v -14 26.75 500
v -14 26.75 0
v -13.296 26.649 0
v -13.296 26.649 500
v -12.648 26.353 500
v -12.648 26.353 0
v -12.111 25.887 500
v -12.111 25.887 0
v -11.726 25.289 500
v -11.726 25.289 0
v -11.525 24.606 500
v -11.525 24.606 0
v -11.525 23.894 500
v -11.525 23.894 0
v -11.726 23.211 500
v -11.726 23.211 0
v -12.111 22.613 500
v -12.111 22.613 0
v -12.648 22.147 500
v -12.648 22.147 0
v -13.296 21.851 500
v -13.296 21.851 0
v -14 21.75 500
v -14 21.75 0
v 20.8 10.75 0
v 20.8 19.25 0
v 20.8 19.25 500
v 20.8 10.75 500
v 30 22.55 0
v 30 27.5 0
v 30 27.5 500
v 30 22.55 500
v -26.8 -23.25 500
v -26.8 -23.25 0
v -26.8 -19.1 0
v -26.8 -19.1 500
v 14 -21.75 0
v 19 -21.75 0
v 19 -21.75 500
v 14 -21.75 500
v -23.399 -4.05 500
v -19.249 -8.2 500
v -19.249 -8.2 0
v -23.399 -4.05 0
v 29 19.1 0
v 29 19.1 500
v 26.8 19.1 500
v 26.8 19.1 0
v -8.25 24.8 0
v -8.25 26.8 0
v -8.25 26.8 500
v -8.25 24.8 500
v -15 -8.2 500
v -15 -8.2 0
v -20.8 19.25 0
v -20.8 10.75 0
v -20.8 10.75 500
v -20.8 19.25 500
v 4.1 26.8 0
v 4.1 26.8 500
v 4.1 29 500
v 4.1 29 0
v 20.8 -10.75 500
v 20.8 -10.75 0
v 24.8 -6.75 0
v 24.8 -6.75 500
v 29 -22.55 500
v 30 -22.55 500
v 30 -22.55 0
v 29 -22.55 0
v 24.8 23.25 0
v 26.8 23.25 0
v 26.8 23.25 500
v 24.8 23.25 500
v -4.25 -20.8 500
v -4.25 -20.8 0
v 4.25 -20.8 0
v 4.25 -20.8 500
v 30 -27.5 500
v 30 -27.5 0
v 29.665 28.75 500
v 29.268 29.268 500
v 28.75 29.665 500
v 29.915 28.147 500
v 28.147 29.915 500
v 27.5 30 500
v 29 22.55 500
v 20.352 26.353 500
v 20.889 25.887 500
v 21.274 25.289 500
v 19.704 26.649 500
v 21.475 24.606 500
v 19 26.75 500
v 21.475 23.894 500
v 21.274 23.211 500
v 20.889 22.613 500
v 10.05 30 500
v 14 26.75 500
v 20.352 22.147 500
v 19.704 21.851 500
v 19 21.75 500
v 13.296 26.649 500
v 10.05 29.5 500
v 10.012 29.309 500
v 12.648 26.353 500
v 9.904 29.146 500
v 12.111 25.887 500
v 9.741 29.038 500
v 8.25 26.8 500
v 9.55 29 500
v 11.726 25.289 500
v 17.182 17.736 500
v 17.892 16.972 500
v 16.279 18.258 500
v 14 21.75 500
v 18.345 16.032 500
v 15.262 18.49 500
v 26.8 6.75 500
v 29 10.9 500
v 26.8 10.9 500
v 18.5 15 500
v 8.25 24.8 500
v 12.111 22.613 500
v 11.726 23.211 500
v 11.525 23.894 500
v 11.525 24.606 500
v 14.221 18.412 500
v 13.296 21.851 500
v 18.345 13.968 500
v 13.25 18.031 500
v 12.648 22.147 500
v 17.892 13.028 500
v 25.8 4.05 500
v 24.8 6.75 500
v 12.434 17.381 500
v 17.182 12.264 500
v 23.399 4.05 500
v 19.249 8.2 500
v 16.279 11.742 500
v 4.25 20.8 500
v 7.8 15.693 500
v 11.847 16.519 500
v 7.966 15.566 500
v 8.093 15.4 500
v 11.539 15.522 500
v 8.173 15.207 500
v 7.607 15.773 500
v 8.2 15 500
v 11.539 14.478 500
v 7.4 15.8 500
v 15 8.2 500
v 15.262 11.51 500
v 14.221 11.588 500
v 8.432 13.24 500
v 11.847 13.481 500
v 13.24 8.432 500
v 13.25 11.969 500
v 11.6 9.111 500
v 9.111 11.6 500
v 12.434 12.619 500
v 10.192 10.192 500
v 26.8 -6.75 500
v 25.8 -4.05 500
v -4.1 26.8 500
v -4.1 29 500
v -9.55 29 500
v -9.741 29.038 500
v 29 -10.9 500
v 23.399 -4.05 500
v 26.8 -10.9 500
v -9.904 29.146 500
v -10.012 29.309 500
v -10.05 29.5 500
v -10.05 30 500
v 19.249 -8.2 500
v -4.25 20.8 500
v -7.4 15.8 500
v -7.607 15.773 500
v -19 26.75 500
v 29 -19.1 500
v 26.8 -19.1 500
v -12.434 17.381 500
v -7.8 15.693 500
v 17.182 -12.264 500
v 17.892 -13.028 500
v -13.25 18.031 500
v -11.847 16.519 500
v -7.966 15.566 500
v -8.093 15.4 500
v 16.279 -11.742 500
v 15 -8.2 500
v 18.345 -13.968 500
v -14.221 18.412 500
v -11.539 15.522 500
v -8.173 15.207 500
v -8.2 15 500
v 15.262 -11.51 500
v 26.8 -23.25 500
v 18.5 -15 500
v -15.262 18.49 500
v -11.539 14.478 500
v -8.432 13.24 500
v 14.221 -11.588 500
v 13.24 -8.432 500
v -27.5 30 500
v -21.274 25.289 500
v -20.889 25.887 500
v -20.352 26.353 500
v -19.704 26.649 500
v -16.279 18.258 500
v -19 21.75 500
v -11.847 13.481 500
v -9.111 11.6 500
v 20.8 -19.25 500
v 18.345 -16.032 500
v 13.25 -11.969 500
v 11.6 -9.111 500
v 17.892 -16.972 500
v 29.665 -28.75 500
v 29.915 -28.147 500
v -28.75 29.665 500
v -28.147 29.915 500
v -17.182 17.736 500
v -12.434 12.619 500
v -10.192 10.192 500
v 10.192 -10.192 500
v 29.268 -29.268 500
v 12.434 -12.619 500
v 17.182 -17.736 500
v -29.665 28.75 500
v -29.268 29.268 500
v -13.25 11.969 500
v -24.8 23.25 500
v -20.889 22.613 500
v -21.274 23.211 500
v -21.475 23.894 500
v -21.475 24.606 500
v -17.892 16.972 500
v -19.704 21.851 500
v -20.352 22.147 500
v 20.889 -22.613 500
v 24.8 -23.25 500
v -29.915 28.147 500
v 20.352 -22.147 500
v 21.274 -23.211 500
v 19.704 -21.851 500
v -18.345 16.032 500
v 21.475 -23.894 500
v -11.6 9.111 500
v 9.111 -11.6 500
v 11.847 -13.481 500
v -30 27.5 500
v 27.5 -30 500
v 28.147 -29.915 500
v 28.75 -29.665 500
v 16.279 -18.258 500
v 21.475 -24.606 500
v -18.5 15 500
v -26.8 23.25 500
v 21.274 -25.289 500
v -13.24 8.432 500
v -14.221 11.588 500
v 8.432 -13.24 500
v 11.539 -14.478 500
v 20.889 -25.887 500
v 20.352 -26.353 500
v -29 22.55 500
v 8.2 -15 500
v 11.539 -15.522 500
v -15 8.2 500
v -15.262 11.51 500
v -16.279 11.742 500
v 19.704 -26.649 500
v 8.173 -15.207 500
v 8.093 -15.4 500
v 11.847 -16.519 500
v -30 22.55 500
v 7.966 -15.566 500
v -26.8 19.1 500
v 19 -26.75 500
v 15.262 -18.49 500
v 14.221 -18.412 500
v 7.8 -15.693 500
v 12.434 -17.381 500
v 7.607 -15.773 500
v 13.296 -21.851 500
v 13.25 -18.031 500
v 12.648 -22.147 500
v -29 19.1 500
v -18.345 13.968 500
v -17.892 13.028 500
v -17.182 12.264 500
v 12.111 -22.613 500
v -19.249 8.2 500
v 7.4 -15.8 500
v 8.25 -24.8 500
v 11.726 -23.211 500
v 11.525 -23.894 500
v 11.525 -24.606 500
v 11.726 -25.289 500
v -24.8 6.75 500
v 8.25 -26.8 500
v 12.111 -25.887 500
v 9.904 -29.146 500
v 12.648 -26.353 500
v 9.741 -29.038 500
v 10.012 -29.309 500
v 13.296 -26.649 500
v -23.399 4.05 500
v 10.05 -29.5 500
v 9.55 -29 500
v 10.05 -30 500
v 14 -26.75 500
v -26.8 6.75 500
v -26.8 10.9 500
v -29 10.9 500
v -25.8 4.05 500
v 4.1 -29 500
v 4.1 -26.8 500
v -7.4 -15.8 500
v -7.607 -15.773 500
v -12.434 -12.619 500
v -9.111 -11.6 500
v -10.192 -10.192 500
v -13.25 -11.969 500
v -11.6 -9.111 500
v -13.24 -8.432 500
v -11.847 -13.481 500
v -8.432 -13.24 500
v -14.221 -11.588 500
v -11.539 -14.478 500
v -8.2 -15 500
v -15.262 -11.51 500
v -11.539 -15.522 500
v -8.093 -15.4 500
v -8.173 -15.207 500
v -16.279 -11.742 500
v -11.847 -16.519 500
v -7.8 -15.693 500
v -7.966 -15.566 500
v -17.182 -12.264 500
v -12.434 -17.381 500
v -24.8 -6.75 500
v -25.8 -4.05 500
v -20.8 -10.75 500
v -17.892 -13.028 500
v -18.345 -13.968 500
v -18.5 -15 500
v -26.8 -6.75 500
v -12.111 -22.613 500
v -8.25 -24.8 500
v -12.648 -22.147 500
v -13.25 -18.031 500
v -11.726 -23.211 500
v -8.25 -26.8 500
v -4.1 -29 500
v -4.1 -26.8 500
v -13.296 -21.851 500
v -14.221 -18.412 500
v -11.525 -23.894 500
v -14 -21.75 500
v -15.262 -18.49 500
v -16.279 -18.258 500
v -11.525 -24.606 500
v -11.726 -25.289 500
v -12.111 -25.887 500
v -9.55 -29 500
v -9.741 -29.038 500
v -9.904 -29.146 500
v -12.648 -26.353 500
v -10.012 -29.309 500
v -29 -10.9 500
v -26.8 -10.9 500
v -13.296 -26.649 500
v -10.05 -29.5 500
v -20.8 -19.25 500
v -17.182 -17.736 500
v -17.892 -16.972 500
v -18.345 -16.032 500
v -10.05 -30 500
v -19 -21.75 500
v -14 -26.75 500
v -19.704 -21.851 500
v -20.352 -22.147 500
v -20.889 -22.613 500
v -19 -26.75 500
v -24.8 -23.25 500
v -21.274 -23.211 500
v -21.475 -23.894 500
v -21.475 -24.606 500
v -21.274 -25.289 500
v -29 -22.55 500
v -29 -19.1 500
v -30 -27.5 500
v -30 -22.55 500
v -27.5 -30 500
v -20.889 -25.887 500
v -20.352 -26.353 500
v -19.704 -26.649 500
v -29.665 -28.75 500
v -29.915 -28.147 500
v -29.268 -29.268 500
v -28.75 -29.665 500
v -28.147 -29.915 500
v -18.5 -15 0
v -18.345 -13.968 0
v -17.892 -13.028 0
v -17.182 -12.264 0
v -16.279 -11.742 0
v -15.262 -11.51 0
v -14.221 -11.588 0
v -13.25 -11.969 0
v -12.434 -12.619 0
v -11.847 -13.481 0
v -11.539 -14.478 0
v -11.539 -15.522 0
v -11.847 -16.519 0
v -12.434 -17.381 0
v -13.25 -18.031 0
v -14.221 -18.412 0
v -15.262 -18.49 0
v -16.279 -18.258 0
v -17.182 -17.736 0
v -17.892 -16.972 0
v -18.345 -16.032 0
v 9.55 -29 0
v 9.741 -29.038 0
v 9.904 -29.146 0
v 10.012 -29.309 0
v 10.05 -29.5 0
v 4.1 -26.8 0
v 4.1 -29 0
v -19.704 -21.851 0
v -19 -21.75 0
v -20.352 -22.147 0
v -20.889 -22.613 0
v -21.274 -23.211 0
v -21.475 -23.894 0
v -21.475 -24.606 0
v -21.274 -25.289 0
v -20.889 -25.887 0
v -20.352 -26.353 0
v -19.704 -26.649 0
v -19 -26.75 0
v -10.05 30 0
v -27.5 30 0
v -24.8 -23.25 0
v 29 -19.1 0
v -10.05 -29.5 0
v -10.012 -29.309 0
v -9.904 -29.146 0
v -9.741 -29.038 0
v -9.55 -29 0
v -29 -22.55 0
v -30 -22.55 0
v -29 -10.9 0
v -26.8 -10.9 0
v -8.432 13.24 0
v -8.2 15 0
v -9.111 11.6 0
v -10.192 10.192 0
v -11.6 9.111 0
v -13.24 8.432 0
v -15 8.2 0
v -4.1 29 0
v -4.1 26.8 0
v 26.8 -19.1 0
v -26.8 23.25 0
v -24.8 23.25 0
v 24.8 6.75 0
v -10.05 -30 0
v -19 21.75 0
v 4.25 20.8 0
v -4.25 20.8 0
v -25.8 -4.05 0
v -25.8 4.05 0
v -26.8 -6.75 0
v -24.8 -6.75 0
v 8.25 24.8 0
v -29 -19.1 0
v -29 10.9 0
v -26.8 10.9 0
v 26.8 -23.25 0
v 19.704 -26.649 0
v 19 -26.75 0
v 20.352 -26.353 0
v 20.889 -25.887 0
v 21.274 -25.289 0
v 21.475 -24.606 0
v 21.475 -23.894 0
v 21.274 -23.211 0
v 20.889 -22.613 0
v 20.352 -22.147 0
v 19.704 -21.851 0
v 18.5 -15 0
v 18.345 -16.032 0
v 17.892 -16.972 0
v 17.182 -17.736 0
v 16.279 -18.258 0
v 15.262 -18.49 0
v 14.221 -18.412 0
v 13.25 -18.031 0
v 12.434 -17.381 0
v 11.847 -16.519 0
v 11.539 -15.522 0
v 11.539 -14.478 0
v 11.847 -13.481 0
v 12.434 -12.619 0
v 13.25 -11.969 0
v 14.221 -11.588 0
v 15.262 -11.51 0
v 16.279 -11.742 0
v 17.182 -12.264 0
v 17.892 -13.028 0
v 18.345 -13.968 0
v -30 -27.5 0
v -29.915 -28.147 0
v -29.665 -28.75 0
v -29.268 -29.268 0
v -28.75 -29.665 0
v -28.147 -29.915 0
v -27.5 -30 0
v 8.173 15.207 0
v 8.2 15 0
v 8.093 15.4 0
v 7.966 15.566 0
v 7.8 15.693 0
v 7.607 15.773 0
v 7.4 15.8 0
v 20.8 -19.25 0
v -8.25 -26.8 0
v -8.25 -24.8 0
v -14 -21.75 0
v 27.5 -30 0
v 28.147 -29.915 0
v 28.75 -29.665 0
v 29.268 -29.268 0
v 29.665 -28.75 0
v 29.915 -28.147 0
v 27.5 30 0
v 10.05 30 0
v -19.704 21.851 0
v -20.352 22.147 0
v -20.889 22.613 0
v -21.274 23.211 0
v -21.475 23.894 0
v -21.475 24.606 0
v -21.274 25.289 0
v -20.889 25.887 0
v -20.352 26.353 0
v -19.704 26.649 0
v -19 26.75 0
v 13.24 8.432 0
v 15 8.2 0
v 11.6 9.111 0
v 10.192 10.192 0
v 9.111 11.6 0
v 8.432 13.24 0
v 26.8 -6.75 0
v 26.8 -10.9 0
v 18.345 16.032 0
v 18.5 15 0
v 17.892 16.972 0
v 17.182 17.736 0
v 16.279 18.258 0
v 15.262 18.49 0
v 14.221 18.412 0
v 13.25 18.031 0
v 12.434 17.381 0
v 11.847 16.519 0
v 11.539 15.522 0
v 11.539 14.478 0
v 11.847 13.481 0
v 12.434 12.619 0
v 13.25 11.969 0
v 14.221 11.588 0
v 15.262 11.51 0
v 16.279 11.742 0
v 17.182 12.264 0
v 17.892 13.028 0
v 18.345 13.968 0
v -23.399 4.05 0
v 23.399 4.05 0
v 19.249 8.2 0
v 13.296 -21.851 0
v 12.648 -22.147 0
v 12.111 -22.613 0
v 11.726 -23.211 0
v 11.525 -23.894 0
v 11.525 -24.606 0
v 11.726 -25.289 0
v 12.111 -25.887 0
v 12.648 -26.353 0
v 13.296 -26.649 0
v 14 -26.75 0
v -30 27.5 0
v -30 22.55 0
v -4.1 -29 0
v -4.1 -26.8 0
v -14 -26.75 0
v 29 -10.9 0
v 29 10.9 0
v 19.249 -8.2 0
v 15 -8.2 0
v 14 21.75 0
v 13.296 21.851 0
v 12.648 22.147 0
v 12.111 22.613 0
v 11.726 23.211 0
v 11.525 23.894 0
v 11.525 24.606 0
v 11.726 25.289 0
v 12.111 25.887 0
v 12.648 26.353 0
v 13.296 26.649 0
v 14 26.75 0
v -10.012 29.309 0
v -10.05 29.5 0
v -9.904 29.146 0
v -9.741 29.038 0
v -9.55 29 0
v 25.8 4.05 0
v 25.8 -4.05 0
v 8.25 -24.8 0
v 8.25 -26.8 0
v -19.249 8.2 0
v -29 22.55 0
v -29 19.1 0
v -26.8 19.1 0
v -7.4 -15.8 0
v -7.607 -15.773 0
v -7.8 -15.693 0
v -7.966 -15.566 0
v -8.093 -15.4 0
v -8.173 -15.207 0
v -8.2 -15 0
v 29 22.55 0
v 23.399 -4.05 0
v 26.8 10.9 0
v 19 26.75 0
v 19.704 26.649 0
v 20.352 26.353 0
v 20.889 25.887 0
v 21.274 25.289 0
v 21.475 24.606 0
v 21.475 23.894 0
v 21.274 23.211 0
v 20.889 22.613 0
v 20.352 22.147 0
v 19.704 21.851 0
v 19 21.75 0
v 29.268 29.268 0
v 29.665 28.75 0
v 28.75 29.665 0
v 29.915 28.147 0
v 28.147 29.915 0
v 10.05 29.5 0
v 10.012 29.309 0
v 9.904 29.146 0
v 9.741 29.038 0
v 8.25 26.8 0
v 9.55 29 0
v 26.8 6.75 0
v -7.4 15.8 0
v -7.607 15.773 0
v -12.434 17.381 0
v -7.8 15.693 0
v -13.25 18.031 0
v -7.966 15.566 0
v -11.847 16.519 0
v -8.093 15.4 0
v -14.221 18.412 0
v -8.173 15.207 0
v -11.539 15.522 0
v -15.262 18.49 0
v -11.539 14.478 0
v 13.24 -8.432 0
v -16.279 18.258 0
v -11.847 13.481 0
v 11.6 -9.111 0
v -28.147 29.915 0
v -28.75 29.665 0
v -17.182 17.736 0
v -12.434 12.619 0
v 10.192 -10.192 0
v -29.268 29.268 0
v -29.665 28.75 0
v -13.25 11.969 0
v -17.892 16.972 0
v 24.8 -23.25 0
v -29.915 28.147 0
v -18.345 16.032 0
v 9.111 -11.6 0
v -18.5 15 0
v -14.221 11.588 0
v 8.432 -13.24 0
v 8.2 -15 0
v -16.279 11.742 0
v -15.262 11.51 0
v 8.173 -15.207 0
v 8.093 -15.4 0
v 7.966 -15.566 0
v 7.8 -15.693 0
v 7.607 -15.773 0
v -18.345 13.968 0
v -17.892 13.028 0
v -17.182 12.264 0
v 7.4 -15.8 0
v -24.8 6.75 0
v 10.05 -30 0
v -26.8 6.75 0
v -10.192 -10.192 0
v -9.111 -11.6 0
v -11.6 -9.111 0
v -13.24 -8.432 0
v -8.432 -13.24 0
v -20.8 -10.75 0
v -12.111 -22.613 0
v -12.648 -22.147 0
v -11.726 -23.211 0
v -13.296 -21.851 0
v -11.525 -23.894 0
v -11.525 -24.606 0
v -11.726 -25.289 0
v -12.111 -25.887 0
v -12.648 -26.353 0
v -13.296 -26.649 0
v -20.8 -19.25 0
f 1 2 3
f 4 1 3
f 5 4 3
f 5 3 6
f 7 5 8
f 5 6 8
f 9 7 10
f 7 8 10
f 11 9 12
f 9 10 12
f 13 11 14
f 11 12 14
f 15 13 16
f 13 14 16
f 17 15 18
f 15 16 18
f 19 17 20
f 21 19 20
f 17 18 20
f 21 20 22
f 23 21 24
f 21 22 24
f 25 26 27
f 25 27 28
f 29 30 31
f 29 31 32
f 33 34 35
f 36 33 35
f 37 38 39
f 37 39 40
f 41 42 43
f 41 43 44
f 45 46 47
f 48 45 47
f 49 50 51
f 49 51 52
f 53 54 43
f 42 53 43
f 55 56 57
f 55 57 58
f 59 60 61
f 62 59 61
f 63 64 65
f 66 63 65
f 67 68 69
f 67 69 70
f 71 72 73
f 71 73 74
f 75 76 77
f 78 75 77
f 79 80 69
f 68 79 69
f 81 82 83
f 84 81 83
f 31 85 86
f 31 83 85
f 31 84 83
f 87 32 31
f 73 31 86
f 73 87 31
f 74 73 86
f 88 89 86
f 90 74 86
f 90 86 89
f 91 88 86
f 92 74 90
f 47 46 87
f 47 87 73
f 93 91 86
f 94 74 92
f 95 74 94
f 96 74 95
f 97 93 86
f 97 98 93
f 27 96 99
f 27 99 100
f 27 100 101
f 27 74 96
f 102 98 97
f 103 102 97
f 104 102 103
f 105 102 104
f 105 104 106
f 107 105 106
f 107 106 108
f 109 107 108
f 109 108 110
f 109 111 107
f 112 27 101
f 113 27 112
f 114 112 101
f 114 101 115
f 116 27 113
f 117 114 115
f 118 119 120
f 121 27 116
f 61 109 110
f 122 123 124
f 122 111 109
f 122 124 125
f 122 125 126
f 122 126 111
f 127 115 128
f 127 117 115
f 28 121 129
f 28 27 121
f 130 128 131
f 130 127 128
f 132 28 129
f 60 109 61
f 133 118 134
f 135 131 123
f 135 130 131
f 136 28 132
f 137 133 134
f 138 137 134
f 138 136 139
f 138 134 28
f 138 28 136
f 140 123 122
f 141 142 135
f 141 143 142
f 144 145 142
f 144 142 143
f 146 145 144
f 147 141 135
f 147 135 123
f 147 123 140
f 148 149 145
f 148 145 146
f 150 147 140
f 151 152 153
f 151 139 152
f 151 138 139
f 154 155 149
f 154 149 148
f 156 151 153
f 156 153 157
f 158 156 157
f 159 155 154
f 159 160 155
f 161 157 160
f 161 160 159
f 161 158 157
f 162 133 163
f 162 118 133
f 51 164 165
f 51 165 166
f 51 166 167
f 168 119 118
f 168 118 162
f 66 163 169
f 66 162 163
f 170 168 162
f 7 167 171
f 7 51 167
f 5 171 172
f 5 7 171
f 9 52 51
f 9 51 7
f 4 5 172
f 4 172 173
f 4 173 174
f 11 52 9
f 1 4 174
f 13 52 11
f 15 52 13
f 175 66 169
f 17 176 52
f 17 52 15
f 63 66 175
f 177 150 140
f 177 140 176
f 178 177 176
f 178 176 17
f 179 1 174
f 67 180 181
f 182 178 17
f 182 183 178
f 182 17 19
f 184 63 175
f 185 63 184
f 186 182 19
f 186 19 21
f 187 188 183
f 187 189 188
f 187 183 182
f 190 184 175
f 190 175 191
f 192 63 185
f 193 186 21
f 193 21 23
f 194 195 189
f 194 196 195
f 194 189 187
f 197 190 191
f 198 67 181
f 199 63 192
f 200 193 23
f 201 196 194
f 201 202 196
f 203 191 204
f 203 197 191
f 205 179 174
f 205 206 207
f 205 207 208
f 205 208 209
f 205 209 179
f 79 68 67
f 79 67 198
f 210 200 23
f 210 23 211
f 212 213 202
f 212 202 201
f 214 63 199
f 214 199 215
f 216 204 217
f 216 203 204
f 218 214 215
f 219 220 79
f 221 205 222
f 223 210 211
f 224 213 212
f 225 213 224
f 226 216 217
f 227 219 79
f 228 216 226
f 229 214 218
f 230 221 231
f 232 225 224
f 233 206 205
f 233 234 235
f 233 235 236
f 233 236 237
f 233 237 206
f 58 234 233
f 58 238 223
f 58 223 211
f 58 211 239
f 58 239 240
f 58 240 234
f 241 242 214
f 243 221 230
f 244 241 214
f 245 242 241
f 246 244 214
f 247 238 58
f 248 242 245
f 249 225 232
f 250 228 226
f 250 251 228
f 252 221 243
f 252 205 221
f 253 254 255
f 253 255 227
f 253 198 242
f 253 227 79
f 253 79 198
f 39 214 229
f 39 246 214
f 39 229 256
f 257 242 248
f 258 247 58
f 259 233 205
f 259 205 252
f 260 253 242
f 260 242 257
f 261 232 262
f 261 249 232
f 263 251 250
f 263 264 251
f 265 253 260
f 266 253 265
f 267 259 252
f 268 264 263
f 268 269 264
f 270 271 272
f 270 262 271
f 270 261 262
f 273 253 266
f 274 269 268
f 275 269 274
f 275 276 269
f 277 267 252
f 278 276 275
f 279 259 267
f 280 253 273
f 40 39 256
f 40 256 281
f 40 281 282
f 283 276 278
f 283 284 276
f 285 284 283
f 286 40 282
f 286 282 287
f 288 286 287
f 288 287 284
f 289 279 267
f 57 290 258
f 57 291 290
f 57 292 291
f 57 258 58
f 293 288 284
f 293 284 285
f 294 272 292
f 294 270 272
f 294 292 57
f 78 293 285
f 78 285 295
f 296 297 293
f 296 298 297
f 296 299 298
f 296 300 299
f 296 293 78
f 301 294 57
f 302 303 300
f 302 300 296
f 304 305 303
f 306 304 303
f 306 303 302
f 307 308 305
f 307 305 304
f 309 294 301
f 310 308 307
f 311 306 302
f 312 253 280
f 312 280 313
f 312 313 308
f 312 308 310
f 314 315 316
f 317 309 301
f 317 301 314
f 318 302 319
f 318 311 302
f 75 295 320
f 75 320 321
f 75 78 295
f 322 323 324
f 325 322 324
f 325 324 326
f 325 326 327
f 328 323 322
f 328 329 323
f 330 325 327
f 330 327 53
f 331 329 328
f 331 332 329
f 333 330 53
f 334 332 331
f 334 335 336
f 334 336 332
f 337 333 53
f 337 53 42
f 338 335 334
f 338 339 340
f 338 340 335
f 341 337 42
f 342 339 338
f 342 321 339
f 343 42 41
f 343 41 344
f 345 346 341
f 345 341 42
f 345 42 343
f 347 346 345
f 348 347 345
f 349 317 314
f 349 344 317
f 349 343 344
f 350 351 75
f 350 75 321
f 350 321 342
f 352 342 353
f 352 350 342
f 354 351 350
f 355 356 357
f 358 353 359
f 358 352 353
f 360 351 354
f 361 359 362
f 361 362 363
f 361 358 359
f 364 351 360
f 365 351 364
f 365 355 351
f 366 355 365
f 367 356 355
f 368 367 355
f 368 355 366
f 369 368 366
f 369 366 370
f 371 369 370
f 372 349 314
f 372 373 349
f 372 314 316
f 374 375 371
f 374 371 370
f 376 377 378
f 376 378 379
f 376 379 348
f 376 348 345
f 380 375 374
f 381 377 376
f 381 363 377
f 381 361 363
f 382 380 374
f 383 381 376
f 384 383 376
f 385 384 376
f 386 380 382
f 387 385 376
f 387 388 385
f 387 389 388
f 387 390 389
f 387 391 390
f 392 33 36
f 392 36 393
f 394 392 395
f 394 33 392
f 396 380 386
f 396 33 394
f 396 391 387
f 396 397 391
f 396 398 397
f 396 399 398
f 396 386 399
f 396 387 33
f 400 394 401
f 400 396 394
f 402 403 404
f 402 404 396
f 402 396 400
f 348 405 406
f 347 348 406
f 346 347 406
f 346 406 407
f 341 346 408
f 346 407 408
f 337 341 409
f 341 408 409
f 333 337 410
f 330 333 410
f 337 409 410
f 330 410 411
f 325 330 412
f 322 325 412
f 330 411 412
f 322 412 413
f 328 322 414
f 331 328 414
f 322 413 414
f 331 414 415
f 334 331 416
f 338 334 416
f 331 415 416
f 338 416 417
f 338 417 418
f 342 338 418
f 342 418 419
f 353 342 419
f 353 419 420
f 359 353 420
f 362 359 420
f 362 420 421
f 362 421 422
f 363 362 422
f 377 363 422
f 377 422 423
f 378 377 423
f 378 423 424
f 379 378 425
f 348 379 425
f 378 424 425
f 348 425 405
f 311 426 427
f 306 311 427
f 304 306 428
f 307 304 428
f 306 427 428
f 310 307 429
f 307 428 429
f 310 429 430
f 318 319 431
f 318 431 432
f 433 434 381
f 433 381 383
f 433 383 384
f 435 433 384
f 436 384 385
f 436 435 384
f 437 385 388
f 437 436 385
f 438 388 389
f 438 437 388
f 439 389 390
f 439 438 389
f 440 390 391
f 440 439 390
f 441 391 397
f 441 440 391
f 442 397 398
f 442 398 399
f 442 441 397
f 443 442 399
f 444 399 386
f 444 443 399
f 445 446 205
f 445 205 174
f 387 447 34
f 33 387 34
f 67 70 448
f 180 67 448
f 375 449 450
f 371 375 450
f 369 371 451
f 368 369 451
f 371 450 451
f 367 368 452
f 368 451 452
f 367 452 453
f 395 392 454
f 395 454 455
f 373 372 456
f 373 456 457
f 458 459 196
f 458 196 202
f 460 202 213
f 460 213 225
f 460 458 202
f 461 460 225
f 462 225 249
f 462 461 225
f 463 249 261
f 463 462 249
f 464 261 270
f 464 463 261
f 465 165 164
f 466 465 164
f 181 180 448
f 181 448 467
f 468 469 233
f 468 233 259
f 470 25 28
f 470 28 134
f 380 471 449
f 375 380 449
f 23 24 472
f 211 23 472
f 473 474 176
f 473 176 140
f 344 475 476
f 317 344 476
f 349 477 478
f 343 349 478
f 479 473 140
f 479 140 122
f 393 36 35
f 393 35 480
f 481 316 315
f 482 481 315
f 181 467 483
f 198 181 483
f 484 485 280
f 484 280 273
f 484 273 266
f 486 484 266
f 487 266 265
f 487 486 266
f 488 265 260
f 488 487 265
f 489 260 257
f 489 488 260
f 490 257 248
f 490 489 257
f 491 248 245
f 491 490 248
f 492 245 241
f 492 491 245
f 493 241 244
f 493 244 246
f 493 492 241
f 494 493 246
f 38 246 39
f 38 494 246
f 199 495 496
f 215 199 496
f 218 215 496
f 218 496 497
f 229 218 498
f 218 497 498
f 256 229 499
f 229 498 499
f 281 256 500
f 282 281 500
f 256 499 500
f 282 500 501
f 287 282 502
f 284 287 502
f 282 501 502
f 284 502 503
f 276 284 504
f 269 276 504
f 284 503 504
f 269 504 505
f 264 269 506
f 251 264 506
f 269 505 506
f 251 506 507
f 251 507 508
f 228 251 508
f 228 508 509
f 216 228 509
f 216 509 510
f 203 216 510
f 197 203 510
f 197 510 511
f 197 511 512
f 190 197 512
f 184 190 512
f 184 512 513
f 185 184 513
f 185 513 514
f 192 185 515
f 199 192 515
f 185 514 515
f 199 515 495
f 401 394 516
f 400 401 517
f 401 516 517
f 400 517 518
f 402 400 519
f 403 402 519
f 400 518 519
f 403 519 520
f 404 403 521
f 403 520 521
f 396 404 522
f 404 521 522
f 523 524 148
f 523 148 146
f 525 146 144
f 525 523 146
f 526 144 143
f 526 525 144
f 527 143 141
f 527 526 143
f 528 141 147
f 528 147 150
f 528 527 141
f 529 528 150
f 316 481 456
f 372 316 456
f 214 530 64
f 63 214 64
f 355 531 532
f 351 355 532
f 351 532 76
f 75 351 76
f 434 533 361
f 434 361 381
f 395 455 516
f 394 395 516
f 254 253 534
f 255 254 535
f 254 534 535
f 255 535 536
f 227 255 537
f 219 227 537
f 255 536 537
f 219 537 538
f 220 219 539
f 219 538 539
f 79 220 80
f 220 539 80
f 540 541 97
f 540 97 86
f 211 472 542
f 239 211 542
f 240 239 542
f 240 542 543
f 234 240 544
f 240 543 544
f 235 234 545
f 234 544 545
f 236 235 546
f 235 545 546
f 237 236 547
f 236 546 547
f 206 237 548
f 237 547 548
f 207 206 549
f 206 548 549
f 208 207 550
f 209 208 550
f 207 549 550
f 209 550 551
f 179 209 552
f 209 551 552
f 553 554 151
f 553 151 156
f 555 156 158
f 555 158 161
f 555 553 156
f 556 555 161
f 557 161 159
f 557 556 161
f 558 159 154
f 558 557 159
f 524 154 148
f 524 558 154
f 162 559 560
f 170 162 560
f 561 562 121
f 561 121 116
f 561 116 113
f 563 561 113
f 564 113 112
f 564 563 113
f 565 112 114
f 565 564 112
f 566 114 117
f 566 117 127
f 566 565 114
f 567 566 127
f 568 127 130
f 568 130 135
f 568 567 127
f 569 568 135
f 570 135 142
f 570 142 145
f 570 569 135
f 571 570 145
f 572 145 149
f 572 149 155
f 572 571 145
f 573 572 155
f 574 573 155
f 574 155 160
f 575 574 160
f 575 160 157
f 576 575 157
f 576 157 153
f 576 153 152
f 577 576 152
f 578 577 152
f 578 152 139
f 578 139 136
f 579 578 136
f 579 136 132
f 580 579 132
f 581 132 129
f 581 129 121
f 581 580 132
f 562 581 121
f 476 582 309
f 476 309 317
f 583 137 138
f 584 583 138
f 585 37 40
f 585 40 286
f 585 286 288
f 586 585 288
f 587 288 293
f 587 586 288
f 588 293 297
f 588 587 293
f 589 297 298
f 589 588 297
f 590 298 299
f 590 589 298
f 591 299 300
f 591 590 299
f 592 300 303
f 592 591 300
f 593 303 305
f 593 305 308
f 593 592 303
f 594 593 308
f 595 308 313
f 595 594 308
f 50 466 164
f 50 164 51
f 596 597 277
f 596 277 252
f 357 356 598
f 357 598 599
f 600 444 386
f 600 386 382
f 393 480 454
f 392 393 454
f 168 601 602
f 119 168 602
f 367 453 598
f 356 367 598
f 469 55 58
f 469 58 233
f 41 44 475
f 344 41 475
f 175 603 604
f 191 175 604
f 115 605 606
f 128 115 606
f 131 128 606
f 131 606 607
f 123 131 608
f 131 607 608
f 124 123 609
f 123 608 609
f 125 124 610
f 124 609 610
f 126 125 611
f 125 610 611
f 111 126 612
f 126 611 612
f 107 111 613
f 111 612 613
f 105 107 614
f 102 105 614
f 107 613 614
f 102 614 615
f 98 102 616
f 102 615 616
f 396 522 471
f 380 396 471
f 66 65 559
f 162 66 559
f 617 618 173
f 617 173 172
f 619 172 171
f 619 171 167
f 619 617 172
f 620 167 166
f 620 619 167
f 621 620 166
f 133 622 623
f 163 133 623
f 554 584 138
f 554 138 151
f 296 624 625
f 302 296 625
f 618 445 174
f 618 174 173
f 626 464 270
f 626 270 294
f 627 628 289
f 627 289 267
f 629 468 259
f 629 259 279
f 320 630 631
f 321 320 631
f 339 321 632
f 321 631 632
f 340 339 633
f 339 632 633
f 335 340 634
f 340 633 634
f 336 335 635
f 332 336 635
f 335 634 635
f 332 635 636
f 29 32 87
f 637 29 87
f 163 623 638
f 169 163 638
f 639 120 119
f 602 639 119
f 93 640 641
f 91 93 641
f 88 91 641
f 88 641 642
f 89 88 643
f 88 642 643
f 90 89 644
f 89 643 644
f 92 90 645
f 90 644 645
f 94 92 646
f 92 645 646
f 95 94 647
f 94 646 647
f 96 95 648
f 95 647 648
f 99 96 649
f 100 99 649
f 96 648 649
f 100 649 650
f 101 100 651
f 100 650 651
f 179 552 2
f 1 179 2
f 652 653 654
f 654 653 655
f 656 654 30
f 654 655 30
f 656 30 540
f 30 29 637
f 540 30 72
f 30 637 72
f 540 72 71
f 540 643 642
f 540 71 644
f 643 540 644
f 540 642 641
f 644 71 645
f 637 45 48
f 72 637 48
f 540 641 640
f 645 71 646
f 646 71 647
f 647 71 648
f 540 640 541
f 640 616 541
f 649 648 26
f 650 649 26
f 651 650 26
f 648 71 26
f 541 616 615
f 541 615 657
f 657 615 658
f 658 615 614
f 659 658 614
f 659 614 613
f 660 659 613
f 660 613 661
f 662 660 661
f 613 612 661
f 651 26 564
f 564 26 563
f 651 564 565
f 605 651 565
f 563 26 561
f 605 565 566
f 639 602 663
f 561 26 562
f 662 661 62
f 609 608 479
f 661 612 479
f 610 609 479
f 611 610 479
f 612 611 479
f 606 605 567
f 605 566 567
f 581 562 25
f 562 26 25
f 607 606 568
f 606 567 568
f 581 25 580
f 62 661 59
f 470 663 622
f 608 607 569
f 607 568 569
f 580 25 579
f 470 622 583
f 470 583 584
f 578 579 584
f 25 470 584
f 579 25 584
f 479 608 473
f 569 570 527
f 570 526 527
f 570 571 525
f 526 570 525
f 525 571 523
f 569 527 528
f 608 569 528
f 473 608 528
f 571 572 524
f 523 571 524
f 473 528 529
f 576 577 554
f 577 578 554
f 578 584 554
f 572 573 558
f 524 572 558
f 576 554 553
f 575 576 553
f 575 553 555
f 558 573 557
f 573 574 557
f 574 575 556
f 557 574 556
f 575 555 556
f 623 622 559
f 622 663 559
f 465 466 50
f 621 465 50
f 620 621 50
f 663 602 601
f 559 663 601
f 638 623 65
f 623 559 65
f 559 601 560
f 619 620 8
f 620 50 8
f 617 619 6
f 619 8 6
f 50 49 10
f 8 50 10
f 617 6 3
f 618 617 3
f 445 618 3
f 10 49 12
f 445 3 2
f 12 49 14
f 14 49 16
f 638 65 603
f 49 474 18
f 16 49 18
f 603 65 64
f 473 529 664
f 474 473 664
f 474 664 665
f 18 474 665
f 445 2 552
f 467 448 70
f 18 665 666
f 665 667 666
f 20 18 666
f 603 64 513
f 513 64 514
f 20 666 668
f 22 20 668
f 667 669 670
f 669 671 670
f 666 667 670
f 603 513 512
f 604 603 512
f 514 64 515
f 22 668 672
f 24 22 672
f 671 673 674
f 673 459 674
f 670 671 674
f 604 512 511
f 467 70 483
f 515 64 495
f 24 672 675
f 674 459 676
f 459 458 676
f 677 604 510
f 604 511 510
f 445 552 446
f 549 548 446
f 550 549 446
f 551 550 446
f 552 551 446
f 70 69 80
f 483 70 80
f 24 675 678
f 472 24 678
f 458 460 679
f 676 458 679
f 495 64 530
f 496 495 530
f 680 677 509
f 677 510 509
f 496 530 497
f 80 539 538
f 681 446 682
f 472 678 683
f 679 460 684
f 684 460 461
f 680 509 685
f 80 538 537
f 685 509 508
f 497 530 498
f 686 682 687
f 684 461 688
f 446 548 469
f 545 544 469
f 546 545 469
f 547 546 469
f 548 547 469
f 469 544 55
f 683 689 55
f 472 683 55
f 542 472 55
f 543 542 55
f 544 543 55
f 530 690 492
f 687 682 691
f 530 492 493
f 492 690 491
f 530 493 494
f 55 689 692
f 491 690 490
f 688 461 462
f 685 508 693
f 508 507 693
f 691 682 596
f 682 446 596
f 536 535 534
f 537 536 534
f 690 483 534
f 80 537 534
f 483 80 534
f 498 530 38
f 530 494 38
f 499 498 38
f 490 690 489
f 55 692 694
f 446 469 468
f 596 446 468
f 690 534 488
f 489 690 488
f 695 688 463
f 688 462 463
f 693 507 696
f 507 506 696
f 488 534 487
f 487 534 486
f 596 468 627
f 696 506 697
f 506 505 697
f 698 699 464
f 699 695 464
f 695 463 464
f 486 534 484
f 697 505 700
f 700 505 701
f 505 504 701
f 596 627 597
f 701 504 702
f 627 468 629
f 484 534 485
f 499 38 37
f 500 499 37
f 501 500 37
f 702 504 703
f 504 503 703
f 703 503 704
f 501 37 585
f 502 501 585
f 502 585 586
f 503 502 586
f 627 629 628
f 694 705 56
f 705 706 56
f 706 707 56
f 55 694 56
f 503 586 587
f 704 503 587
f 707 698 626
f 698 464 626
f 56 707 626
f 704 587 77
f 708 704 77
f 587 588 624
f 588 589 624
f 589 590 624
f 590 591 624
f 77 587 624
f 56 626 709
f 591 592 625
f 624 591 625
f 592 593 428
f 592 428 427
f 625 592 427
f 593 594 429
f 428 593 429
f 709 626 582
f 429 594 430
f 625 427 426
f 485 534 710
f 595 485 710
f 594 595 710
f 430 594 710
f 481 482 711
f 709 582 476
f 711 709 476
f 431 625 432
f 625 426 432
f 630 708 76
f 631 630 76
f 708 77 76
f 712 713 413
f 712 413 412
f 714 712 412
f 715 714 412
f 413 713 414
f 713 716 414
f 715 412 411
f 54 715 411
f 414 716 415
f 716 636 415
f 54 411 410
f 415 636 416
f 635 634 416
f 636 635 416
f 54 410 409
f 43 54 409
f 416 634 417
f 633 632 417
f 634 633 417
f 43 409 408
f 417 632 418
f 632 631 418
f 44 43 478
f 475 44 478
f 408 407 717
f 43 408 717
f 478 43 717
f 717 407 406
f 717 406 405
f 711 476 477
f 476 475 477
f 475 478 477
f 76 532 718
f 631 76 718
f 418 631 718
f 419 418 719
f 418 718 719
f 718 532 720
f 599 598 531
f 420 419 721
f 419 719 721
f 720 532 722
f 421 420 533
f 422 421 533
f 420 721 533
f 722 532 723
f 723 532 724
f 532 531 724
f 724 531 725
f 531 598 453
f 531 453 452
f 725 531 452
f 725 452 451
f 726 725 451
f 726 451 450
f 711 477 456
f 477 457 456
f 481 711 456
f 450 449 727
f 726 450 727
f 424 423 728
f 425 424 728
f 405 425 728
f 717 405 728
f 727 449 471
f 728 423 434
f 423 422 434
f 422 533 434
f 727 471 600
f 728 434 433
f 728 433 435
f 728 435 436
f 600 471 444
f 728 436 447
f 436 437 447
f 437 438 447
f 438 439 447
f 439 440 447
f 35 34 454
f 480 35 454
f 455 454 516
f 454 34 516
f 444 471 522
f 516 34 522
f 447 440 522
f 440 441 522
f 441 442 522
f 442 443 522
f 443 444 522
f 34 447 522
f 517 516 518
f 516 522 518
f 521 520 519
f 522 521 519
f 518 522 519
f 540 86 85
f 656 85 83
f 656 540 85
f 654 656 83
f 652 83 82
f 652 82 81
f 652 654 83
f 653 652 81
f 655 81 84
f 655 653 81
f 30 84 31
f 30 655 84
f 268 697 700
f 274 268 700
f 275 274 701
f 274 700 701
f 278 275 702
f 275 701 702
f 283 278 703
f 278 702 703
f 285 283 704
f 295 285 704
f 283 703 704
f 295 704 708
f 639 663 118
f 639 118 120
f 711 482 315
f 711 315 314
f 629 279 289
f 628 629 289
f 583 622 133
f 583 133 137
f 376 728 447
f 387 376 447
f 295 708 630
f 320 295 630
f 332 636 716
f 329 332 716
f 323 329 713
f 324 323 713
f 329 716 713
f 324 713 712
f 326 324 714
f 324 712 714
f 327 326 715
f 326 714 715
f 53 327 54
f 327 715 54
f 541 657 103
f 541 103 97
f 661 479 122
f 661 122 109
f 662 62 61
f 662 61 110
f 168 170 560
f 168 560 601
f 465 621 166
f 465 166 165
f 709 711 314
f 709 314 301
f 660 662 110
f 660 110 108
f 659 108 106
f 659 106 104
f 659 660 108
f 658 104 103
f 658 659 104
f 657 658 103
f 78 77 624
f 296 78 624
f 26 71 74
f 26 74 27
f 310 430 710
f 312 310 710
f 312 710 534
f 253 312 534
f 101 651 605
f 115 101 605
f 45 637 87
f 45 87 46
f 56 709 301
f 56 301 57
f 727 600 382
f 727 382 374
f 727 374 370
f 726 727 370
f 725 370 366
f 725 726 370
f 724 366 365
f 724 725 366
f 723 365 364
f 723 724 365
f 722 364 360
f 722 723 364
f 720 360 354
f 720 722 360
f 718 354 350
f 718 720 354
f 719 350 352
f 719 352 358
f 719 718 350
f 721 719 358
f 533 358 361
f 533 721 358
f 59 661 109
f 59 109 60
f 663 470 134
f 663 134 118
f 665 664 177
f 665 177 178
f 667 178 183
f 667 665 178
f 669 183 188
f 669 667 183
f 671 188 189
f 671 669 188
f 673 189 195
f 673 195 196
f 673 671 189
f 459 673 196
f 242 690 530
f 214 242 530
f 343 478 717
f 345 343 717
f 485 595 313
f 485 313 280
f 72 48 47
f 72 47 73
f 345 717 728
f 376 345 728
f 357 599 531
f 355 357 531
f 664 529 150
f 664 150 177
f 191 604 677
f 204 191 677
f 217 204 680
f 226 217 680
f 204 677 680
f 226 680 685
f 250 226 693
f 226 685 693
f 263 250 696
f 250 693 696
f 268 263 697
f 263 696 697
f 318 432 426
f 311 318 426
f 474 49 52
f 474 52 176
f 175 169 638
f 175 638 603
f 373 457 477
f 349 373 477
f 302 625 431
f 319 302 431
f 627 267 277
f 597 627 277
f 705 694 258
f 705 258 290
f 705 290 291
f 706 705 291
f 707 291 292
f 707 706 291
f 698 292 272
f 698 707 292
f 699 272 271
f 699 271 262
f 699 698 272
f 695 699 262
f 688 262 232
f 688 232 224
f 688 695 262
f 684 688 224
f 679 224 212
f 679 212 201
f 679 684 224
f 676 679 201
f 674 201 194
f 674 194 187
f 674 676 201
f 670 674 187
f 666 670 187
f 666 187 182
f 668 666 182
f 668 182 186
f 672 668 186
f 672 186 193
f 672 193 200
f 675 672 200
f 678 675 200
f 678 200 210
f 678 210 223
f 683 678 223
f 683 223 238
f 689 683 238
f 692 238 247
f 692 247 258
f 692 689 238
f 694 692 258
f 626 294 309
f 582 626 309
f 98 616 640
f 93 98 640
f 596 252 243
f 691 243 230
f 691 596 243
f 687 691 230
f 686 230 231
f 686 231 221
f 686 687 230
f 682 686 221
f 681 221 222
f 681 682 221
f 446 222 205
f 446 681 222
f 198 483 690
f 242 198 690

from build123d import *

# Parameters (mm, degrees)
SKETCH_2_R      = 3.5
EXTRUDE_3_DEPTH = 500


with BuildPart() as part:
    # Эскиз2 → Бобышка-Вытянуть3 (new body)
    with BuildSketch(Plane.XY):
        with BuildLine():
            Line((-4.25, 20.8), (4.25, 20.8))
            Line((4.25, 20.8), (8.25, 24.8))
            Line((8.25, 24.8), (8.25, 26.8))
            Line((8.25, 26.8), (4.1, 26.8))
            Line((4.1, 26.8), (4.1, 29))
            Line((4.1, 29), (9.55, 29))
            ThreePointArc((9.55, 29), (9.903553391, 29.146446609), (10.05, 29.5))
            Line((10.05, 29.5), (10.05, 30))
            Line((10.05, 30), (27.5, 30))
            ThreePointArc((27.5, 30), (29.267766953, 29.267766953), (30, 27.5))
            Line((30, 27.5), (30, 22.55))
            Line((30, 22.55), (29, 22.55))
            Line((29, 22.55), (29, 19.1))
            Line((29, 19.1), (26.8, 19.1))
            Line((26.8, 19.1), (26.8, 23.25))
            Line((26.8, 23.25), (24.8, 23.25))
            Line((24.8, 23.25), (20.8, 19.25))
            Line((20.8, 19.25), (20.8, 10.75))
            Line((20.8, 10.75), (24.8, 6.75))
            Line((24.8, 6.75), (26.8, 6.75))
            Line((26.8, 6.75), (26.8, 10.9))
            Line((26.8, 10.9), (29, 10.9))
            Line((29, 10.9), (29, 0))
            Line((29, 0), (25.8, 0))
            Line((25.8, 0), (25.8, 4.05))
            Line((25.8, 4.05), (23.398780669, 4.05))
            Line((23.398780669, 4.05), (19.248780669, 8.2))
            Line((19.248780669, 8.2), (15, 8.2))
            ThreePointArc((15, 8.2), (10.191673888, 10.191673888), (8.2, 15))
            ThreePointArc((8.2, 15), (7.965685425, 15.565685425), (7.4, 15.8))
            Line((7.4, 15.8), (-7.4, 15.8))
            ThreePointArc((-7.4, 15.8), (-7.965685425, 15.565685425), (-8.2, 15))
            ThreePointArc((-8.2, 15), (-10.191673888, 10.191673888), (-15, 8.2))
            Line((-15, 8.2), (-19.248780669, 8.2))
            Line((-19.248780669, 8.2), (-23.398780669, 4.05))
            Line((-23.398780669, 4.05), (-25.8, 4.05))
            Line((-25.8, 4.05), (-25.8, 0))
            Line((-25.8, 0), (-29, 0))
            Line((-29, 0), (-29, 10.9))
            Line((-29, 10.9), (-26.8, 10.9))
            Line((-26.8, 10.9), (-26.8, 6.75))
            Line((-26.8, 6.75), (-24.8, 6.75))
            Line((-24.8, 6.75), (-20.8, 10.75))
            Line((-20.8, 10.75), (-20.8, 19.25))
            Line((-20.8, 19.25), (-24.8, 23.25))
            Line((-24.8, 23.25), (-26.8, 23.25))
            Line((-26.8, 23.25), (-26.8, 19.1))
            Line((-26.8, 19.1), (-29, 19.1))
            Line((-29, 19.1), (-29, 22.55))
            Line((-29, 22.55), (-30, 22.55))
            Line((-30, 22.55), (-30, 27.5))
            ThreePointArc((-30, 27.5), (-29.267766953, 29.267766953), (-27.5, 30))
            Line((-27.5, 30), (-10.05, 30))
            Line((-10.05, 30), (-10.05, 29.5))
            ThreePointArc((-10.05, 29.5), (-9.903553391, 29.146446609), (-9.55, 29))
            Line((-9.55, 29), (-4.1, 29))
            Line((-4.1, 29), (-4.1, 26.8))
            Line((-4.1, 26.8), (-8.25, 26.8))
            Line((-8.25, 26.8), (-8.25, 24.8))
            Line((-8.25, 24.8), (-4.25, 20.8))
        make_face()
        with Locations((15, 15)):
            Circle(SKETCH_2_R, mode=Mode.SUBTRACT)
        with Locations(Location((-15, 15, 0), (0, 0, 180))):
            Circle(SKETCH_2_R, mode=Mode.SUBTRACT)
        with BuildLine():
            Line((14, 26.75), (19, 26.75))
            ThreePointArc((19, 26.75), (21.5, 24.25), (19, 21.75))
            Line((19, 21.75), (14, 21.75))
            ThreePointArc((14, 21.75), (11.5, 24.25), (14, 26.75))
        make_face(mode=Mode.SUBTRACT)
        with BuildLine():
            Line((-14, 21.75), (-19, 21.75))
            ThreePointArc((-19, 21.75), (-21.5, 24.25), (-19, 26.75))
            Line((-19, 26.75), (-14, 26.75))
            ThreePointArc((-14, 26.75), (-11.5, 24.25), (-14, 21.75))
        make_face(mode=Mode.SUBTRACT)
    extrude_3 = extrude(amount=EXTRUDE_3_DEPTH)

    # Зеркальное отражение13: Бобышка-Вытянуть3 across plane
    add(extrude_3.mirror(Plane(origin=(25.8, 0, 500), x_dir=(0, 0, 1), z_dir=(0, 1, 0))))


solid = part.part
